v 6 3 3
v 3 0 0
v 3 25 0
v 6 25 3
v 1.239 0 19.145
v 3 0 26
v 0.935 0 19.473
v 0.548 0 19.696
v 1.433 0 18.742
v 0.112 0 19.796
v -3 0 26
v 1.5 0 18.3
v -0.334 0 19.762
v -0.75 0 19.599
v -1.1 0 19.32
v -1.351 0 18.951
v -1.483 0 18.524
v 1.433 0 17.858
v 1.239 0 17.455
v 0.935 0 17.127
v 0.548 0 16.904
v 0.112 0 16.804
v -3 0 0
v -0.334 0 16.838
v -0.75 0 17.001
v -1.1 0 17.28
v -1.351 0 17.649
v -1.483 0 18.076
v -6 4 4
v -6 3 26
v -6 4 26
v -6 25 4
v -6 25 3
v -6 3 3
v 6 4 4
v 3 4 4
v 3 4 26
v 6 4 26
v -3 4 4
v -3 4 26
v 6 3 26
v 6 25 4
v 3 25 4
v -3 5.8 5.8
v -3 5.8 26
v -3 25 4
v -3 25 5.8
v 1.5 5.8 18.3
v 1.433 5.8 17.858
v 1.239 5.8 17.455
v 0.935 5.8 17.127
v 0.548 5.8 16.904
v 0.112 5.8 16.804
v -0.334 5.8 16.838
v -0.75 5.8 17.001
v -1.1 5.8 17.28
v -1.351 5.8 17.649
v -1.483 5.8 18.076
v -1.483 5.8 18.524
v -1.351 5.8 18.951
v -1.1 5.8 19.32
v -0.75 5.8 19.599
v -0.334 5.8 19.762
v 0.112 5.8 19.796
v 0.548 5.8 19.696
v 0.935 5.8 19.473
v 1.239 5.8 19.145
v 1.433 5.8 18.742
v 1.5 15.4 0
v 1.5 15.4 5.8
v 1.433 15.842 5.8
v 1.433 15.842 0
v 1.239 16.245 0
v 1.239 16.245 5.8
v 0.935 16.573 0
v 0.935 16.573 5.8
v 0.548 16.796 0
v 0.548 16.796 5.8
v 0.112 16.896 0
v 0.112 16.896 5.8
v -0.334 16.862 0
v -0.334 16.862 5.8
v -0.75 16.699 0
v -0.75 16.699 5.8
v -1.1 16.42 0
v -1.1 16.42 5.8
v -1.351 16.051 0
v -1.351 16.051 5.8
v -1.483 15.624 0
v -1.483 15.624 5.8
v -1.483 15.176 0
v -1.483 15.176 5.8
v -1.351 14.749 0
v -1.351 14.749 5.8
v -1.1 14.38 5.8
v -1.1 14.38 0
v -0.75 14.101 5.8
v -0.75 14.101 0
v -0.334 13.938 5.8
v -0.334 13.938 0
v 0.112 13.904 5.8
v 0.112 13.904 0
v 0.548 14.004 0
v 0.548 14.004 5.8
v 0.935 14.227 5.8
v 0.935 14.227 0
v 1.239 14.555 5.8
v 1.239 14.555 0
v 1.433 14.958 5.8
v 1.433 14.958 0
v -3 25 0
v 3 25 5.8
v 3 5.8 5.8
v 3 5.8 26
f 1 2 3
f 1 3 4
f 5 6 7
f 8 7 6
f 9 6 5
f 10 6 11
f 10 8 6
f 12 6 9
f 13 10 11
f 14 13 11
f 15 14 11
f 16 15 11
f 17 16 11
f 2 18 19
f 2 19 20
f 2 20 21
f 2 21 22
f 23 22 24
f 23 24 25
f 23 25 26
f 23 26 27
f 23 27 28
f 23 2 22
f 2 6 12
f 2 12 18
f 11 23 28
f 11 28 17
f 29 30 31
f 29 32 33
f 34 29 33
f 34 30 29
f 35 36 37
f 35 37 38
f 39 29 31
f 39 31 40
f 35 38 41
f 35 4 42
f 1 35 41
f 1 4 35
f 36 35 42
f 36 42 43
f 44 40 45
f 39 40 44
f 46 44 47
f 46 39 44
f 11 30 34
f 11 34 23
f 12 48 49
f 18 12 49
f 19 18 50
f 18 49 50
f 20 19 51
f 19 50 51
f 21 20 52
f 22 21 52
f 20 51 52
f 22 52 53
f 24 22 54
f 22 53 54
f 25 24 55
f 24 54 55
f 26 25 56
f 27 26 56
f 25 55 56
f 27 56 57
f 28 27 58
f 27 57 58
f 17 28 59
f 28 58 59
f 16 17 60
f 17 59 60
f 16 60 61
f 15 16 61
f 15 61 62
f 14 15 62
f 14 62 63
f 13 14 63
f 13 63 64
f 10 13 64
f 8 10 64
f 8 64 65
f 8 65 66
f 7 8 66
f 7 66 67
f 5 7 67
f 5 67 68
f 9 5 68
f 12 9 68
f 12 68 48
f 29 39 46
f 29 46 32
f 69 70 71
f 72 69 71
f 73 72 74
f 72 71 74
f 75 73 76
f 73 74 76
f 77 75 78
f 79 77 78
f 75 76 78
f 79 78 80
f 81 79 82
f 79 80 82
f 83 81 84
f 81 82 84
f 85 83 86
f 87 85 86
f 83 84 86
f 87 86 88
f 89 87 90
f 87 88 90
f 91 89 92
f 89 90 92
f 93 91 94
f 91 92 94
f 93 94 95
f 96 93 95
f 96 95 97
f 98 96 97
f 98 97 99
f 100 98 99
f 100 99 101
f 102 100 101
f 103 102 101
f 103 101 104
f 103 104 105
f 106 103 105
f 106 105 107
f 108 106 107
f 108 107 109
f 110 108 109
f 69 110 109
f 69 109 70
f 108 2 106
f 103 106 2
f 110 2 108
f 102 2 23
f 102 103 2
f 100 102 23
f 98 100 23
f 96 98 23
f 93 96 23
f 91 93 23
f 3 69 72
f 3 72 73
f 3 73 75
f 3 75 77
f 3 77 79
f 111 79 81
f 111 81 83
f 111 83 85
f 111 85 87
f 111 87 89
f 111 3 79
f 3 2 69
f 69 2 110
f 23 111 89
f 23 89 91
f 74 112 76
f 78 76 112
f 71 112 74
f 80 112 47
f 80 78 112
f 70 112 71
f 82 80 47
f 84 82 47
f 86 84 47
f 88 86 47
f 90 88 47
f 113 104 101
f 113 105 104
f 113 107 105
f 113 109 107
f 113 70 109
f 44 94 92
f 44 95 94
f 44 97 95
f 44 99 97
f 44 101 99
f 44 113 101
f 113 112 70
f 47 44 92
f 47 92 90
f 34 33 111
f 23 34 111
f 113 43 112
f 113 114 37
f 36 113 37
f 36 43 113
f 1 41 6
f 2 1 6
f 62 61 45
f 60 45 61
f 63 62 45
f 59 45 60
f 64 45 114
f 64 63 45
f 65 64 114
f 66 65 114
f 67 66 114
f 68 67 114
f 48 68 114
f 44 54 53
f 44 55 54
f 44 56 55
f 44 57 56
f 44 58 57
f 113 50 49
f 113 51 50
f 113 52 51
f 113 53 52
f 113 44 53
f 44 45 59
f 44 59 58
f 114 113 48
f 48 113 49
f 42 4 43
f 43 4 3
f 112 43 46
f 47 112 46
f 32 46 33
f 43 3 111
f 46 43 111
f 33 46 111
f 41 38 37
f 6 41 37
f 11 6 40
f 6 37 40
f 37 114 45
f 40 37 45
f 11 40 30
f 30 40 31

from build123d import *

# Parameters (mm, degrees)
ESTRUSIONE_ESTRUSIONE1_DEPTH = 26
ESTRUSIONE_ESTRUSIONE2_DEPTH = 25
TAGLIO_ESTRUSIONE1_DEPTH     = 5
TAGLIO_ESTRUSIONE2_DEPTH     = 5
SCHIZZO5_R                   = 1.5
TAGLIO_ESTRUSIONE3_DEPTH     = 6.8
SCHIZZO6_R                   = 1.5
TAGLIO_ESTRUSIONE4_DEPTH     = 6.8


with BuildPart() as part:
    # Schizzo1 → Estrusione-Estrusione1 (new body)
    with BuildSketch(Plane.XY):
        Polygon((3, 0), (-3, 0), (-6, 3), (-6, 4), (-3, 4), (-3, 5.8), (3, 5.8), (3, 4), (6, 4), (6, 3), align=None)
    extrude(amount=ESTRUSIONE_ESTRUSIONE1_DEPTH)

    # Schizzo2 → Estrusione-Estrusione2 (add)
    with BuildSketch(Plane(origin=(0, 0, 0), x_dir=(1, 0, 0), z_dir=(0, 1, 0))):
        Polygon((3, 0), (6, -3), (6, -4), (3, -4), (3, -5.8), (-3, -5.8), (-3, -4), (-6, -4), (-6, -3), (-3, 0), align=None)
    extrude(amount=ESTRUSIONE_ESTRUSIONE2_DEPTH)

    # Schizzo3 → Taglio-Estrusione1 (cut)
    with BuildSketch(Plane(origin=(0, 0, 0), x_dir=(1, 0, 0), z_dir=(0, 1, 0))):
        Polygon((-3, 0), (-6, -3), (-6, 0), align=None)
        Polygon((6, -3), (6, 0), (3, 0), align=None)
    extrude(amount=TAGLIO_ESTRUSIONE1_DEPTH, mode=Mode.SUBTRACT)

    # Schizzo4 → Taglio-Estrusione2 (cut)
    with BuildSketch(Plane.XY.offset(4)):
        Polygon((-6, 3), (-3, 0), (-6, 0), align=None)
        Polygon((3, 0), (6, 0), (6, 3), align=None)
    extrude(amount=-TAGLIO_ESTRUSIONE2_DEPTH, mode=Mode.SUBTRACT)

    # Schizzo5 → Taglio-Estrusione3 (cut, through all)
    with BuildSketch(Plane.XY.offset(5.8)):
        with Locations((0, 15.4)):
            Circle(SCHIZZO5_R)
    extrude(amount=-TAGLIO_ESTRUSIONE3_DEPTH, mode=Mode.SUBTRACT)

    # Schizzo6 → Taglio-Estrusione4 (cut, through all)
    with BuildSketch(Plane(origin=(0, 5.8, 0), x_dir=(1, 0, 0), z_dir=(0, 1, 0))):
        with Locations((0, -18.3)):
            Circle(SCHIZZO6_R)
    extrude(amount=-TAGLIO_ESTRUSIONE4_DEPTH, mode=Mode.SUBTRACT)


solid = part.part
